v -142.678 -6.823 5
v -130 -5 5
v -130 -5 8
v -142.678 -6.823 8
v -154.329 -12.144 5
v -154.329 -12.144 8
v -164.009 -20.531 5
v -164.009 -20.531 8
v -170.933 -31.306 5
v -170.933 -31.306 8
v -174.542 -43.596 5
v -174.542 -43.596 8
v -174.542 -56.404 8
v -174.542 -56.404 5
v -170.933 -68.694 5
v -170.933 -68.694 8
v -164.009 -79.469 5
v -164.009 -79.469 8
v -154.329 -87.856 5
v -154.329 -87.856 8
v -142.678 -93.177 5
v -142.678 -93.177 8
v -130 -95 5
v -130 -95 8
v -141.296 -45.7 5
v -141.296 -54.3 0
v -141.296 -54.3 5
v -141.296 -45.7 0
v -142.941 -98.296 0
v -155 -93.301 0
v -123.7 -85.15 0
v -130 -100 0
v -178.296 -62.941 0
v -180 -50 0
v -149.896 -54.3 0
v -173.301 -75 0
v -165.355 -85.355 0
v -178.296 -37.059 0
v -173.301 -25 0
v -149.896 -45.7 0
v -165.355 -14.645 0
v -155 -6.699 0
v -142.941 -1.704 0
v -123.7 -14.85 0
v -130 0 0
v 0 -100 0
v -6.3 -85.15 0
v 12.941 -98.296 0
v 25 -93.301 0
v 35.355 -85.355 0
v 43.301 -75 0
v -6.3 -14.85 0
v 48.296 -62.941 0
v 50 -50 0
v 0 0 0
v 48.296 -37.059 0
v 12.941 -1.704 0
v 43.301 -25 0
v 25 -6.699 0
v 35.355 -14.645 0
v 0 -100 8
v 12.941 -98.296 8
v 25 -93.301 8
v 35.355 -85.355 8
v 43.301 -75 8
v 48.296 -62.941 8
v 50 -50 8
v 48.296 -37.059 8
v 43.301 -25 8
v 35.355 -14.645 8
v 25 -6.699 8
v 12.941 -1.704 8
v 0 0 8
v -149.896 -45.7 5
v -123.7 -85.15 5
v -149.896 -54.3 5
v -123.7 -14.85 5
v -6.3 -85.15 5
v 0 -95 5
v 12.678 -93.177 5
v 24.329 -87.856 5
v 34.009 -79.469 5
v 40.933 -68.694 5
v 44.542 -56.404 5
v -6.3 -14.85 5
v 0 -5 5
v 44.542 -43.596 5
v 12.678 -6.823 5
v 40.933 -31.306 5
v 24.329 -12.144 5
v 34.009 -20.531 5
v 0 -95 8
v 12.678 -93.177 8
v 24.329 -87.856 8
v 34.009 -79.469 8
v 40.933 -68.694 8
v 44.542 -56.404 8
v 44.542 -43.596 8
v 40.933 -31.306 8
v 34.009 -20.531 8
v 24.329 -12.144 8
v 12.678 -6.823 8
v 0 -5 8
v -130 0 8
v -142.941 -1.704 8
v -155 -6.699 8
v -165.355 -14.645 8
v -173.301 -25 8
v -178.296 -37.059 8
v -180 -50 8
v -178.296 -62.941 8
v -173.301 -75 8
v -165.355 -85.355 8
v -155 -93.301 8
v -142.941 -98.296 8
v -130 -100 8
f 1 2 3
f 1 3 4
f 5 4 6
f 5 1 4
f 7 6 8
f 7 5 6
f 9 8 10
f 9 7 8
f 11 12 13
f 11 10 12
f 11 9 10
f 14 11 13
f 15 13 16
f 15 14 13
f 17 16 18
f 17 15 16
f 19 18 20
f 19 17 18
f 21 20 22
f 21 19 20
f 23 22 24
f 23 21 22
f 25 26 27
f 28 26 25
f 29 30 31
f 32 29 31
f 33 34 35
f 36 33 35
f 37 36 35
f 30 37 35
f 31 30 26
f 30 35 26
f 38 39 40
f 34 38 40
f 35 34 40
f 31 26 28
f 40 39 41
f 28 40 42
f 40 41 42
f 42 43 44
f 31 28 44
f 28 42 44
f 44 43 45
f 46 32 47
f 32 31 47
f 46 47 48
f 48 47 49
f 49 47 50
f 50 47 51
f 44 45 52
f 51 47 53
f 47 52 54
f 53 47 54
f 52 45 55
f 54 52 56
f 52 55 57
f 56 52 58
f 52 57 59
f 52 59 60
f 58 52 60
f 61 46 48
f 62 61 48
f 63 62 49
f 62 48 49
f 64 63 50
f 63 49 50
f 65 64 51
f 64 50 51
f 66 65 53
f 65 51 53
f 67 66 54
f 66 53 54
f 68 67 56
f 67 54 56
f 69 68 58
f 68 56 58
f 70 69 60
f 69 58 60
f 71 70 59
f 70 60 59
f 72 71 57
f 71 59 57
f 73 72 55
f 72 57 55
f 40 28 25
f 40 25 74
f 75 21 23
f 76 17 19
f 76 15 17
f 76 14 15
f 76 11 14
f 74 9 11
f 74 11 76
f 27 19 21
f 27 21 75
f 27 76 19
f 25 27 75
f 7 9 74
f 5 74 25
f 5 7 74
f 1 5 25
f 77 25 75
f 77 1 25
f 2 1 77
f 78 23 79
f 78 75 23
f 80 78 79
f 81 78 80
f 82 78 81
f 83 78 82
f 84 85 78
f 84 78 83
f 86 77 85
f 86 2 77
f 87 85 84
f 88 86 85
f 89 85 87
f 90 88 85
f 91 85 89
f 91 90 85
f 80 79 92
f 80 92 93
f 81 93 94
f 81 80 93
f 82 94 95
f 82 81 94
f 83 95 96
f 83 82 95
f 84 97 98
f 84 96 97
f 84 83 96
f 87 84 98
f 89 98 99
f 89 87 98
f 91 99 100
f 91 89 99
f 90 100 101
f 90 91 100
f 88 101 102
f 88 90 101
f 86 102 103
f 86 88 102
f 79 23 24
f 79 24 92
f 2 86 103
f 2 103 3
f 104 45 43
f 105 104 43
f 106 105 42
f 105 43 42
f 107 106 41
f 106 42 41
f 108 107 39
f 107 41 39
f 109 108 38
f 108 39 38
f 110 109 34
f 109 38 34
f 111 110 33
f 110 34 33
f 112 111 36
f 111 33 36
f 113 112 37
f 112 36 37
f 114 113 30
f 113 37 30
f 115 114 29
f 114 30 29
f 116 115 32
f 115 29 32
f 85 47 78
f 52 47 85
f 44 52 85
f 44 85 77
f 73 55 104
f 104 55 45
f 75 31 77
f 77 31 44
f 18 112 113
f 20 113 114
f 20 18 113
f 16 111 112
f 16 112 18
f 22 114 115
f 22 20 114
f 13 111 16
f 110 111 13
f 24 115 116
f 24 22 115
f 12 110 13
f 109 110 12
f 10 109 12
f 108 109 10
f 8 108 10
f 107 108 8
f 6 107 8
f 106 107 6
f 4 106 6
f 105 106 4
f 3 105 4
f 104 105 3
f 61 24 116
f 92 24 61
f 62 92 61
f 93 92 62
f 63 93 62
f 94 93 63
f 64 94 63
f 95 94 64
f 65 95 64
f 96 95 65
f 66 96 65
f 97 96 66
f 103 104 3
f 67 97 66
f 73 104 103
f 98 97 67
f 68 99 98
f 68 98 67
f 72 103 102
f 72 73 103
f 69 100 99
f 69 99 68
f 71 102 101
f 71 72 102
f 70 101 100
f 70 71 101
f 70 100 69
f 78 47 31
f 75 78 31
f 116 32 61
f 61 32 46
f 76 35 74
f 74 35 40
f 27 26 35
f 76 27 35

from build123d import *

# Parameters (mm, degrees)
BOSS_EXTRUDE1_DEPTH = 8
SHELL1_T            = -5
SKETCH2_W           = 117.4
SKETCH2_H           = 70.3
SKETCH2_W_2         = 8.6
SKETCH2_H_2         = 8.6
CUT_EXTRUDE1_DEPTH  = 5


with BuildPart() as part:
    # Sketch1 → Boss-Extrude1 (new body)
    with BuildSketch(Plane.XY):
        with BuildLine():
            Line((0, 0), (-130, 0))
            ThreePointArc((-130, 0), (-180, -50), (-130, -100))
            Line((-130, -100), (0, -100))
            ThreePointArc((0, -100), (50, -50), (0, 0))
        make_face()
    extrude(amount=BOSS_EXTRUDE1_DEPTH)

    # Shell1
    shell1_openings = [part.faces().sort_by_distance(p)[0] for p in [
        (-65, -50, 8),
    ]]
    offset(amount=SHELL1_T, openings=shell1_openings, kind=Kind.INTERSECTION)

    # Sketch2 → Cut-Extrude1 (cut)
    with BuildSketch(Plane(origin=(0, 0, 0), x_dir=(-1, 0, 0), z_dir=(0, 0, -1))):
        with Locations((65, -50)):
            Rectangle(SKETCH2_W, SKETCH2_H)
        with Locations((145.596085379, -50)):
            Rectangle(SKETCH2_W_2, SKETCH2_H_2)
    extrude(amount=-CUT_EXTRUDE1_DEPTH, mode=Mode.SUBTRACT)


solid = part.part
